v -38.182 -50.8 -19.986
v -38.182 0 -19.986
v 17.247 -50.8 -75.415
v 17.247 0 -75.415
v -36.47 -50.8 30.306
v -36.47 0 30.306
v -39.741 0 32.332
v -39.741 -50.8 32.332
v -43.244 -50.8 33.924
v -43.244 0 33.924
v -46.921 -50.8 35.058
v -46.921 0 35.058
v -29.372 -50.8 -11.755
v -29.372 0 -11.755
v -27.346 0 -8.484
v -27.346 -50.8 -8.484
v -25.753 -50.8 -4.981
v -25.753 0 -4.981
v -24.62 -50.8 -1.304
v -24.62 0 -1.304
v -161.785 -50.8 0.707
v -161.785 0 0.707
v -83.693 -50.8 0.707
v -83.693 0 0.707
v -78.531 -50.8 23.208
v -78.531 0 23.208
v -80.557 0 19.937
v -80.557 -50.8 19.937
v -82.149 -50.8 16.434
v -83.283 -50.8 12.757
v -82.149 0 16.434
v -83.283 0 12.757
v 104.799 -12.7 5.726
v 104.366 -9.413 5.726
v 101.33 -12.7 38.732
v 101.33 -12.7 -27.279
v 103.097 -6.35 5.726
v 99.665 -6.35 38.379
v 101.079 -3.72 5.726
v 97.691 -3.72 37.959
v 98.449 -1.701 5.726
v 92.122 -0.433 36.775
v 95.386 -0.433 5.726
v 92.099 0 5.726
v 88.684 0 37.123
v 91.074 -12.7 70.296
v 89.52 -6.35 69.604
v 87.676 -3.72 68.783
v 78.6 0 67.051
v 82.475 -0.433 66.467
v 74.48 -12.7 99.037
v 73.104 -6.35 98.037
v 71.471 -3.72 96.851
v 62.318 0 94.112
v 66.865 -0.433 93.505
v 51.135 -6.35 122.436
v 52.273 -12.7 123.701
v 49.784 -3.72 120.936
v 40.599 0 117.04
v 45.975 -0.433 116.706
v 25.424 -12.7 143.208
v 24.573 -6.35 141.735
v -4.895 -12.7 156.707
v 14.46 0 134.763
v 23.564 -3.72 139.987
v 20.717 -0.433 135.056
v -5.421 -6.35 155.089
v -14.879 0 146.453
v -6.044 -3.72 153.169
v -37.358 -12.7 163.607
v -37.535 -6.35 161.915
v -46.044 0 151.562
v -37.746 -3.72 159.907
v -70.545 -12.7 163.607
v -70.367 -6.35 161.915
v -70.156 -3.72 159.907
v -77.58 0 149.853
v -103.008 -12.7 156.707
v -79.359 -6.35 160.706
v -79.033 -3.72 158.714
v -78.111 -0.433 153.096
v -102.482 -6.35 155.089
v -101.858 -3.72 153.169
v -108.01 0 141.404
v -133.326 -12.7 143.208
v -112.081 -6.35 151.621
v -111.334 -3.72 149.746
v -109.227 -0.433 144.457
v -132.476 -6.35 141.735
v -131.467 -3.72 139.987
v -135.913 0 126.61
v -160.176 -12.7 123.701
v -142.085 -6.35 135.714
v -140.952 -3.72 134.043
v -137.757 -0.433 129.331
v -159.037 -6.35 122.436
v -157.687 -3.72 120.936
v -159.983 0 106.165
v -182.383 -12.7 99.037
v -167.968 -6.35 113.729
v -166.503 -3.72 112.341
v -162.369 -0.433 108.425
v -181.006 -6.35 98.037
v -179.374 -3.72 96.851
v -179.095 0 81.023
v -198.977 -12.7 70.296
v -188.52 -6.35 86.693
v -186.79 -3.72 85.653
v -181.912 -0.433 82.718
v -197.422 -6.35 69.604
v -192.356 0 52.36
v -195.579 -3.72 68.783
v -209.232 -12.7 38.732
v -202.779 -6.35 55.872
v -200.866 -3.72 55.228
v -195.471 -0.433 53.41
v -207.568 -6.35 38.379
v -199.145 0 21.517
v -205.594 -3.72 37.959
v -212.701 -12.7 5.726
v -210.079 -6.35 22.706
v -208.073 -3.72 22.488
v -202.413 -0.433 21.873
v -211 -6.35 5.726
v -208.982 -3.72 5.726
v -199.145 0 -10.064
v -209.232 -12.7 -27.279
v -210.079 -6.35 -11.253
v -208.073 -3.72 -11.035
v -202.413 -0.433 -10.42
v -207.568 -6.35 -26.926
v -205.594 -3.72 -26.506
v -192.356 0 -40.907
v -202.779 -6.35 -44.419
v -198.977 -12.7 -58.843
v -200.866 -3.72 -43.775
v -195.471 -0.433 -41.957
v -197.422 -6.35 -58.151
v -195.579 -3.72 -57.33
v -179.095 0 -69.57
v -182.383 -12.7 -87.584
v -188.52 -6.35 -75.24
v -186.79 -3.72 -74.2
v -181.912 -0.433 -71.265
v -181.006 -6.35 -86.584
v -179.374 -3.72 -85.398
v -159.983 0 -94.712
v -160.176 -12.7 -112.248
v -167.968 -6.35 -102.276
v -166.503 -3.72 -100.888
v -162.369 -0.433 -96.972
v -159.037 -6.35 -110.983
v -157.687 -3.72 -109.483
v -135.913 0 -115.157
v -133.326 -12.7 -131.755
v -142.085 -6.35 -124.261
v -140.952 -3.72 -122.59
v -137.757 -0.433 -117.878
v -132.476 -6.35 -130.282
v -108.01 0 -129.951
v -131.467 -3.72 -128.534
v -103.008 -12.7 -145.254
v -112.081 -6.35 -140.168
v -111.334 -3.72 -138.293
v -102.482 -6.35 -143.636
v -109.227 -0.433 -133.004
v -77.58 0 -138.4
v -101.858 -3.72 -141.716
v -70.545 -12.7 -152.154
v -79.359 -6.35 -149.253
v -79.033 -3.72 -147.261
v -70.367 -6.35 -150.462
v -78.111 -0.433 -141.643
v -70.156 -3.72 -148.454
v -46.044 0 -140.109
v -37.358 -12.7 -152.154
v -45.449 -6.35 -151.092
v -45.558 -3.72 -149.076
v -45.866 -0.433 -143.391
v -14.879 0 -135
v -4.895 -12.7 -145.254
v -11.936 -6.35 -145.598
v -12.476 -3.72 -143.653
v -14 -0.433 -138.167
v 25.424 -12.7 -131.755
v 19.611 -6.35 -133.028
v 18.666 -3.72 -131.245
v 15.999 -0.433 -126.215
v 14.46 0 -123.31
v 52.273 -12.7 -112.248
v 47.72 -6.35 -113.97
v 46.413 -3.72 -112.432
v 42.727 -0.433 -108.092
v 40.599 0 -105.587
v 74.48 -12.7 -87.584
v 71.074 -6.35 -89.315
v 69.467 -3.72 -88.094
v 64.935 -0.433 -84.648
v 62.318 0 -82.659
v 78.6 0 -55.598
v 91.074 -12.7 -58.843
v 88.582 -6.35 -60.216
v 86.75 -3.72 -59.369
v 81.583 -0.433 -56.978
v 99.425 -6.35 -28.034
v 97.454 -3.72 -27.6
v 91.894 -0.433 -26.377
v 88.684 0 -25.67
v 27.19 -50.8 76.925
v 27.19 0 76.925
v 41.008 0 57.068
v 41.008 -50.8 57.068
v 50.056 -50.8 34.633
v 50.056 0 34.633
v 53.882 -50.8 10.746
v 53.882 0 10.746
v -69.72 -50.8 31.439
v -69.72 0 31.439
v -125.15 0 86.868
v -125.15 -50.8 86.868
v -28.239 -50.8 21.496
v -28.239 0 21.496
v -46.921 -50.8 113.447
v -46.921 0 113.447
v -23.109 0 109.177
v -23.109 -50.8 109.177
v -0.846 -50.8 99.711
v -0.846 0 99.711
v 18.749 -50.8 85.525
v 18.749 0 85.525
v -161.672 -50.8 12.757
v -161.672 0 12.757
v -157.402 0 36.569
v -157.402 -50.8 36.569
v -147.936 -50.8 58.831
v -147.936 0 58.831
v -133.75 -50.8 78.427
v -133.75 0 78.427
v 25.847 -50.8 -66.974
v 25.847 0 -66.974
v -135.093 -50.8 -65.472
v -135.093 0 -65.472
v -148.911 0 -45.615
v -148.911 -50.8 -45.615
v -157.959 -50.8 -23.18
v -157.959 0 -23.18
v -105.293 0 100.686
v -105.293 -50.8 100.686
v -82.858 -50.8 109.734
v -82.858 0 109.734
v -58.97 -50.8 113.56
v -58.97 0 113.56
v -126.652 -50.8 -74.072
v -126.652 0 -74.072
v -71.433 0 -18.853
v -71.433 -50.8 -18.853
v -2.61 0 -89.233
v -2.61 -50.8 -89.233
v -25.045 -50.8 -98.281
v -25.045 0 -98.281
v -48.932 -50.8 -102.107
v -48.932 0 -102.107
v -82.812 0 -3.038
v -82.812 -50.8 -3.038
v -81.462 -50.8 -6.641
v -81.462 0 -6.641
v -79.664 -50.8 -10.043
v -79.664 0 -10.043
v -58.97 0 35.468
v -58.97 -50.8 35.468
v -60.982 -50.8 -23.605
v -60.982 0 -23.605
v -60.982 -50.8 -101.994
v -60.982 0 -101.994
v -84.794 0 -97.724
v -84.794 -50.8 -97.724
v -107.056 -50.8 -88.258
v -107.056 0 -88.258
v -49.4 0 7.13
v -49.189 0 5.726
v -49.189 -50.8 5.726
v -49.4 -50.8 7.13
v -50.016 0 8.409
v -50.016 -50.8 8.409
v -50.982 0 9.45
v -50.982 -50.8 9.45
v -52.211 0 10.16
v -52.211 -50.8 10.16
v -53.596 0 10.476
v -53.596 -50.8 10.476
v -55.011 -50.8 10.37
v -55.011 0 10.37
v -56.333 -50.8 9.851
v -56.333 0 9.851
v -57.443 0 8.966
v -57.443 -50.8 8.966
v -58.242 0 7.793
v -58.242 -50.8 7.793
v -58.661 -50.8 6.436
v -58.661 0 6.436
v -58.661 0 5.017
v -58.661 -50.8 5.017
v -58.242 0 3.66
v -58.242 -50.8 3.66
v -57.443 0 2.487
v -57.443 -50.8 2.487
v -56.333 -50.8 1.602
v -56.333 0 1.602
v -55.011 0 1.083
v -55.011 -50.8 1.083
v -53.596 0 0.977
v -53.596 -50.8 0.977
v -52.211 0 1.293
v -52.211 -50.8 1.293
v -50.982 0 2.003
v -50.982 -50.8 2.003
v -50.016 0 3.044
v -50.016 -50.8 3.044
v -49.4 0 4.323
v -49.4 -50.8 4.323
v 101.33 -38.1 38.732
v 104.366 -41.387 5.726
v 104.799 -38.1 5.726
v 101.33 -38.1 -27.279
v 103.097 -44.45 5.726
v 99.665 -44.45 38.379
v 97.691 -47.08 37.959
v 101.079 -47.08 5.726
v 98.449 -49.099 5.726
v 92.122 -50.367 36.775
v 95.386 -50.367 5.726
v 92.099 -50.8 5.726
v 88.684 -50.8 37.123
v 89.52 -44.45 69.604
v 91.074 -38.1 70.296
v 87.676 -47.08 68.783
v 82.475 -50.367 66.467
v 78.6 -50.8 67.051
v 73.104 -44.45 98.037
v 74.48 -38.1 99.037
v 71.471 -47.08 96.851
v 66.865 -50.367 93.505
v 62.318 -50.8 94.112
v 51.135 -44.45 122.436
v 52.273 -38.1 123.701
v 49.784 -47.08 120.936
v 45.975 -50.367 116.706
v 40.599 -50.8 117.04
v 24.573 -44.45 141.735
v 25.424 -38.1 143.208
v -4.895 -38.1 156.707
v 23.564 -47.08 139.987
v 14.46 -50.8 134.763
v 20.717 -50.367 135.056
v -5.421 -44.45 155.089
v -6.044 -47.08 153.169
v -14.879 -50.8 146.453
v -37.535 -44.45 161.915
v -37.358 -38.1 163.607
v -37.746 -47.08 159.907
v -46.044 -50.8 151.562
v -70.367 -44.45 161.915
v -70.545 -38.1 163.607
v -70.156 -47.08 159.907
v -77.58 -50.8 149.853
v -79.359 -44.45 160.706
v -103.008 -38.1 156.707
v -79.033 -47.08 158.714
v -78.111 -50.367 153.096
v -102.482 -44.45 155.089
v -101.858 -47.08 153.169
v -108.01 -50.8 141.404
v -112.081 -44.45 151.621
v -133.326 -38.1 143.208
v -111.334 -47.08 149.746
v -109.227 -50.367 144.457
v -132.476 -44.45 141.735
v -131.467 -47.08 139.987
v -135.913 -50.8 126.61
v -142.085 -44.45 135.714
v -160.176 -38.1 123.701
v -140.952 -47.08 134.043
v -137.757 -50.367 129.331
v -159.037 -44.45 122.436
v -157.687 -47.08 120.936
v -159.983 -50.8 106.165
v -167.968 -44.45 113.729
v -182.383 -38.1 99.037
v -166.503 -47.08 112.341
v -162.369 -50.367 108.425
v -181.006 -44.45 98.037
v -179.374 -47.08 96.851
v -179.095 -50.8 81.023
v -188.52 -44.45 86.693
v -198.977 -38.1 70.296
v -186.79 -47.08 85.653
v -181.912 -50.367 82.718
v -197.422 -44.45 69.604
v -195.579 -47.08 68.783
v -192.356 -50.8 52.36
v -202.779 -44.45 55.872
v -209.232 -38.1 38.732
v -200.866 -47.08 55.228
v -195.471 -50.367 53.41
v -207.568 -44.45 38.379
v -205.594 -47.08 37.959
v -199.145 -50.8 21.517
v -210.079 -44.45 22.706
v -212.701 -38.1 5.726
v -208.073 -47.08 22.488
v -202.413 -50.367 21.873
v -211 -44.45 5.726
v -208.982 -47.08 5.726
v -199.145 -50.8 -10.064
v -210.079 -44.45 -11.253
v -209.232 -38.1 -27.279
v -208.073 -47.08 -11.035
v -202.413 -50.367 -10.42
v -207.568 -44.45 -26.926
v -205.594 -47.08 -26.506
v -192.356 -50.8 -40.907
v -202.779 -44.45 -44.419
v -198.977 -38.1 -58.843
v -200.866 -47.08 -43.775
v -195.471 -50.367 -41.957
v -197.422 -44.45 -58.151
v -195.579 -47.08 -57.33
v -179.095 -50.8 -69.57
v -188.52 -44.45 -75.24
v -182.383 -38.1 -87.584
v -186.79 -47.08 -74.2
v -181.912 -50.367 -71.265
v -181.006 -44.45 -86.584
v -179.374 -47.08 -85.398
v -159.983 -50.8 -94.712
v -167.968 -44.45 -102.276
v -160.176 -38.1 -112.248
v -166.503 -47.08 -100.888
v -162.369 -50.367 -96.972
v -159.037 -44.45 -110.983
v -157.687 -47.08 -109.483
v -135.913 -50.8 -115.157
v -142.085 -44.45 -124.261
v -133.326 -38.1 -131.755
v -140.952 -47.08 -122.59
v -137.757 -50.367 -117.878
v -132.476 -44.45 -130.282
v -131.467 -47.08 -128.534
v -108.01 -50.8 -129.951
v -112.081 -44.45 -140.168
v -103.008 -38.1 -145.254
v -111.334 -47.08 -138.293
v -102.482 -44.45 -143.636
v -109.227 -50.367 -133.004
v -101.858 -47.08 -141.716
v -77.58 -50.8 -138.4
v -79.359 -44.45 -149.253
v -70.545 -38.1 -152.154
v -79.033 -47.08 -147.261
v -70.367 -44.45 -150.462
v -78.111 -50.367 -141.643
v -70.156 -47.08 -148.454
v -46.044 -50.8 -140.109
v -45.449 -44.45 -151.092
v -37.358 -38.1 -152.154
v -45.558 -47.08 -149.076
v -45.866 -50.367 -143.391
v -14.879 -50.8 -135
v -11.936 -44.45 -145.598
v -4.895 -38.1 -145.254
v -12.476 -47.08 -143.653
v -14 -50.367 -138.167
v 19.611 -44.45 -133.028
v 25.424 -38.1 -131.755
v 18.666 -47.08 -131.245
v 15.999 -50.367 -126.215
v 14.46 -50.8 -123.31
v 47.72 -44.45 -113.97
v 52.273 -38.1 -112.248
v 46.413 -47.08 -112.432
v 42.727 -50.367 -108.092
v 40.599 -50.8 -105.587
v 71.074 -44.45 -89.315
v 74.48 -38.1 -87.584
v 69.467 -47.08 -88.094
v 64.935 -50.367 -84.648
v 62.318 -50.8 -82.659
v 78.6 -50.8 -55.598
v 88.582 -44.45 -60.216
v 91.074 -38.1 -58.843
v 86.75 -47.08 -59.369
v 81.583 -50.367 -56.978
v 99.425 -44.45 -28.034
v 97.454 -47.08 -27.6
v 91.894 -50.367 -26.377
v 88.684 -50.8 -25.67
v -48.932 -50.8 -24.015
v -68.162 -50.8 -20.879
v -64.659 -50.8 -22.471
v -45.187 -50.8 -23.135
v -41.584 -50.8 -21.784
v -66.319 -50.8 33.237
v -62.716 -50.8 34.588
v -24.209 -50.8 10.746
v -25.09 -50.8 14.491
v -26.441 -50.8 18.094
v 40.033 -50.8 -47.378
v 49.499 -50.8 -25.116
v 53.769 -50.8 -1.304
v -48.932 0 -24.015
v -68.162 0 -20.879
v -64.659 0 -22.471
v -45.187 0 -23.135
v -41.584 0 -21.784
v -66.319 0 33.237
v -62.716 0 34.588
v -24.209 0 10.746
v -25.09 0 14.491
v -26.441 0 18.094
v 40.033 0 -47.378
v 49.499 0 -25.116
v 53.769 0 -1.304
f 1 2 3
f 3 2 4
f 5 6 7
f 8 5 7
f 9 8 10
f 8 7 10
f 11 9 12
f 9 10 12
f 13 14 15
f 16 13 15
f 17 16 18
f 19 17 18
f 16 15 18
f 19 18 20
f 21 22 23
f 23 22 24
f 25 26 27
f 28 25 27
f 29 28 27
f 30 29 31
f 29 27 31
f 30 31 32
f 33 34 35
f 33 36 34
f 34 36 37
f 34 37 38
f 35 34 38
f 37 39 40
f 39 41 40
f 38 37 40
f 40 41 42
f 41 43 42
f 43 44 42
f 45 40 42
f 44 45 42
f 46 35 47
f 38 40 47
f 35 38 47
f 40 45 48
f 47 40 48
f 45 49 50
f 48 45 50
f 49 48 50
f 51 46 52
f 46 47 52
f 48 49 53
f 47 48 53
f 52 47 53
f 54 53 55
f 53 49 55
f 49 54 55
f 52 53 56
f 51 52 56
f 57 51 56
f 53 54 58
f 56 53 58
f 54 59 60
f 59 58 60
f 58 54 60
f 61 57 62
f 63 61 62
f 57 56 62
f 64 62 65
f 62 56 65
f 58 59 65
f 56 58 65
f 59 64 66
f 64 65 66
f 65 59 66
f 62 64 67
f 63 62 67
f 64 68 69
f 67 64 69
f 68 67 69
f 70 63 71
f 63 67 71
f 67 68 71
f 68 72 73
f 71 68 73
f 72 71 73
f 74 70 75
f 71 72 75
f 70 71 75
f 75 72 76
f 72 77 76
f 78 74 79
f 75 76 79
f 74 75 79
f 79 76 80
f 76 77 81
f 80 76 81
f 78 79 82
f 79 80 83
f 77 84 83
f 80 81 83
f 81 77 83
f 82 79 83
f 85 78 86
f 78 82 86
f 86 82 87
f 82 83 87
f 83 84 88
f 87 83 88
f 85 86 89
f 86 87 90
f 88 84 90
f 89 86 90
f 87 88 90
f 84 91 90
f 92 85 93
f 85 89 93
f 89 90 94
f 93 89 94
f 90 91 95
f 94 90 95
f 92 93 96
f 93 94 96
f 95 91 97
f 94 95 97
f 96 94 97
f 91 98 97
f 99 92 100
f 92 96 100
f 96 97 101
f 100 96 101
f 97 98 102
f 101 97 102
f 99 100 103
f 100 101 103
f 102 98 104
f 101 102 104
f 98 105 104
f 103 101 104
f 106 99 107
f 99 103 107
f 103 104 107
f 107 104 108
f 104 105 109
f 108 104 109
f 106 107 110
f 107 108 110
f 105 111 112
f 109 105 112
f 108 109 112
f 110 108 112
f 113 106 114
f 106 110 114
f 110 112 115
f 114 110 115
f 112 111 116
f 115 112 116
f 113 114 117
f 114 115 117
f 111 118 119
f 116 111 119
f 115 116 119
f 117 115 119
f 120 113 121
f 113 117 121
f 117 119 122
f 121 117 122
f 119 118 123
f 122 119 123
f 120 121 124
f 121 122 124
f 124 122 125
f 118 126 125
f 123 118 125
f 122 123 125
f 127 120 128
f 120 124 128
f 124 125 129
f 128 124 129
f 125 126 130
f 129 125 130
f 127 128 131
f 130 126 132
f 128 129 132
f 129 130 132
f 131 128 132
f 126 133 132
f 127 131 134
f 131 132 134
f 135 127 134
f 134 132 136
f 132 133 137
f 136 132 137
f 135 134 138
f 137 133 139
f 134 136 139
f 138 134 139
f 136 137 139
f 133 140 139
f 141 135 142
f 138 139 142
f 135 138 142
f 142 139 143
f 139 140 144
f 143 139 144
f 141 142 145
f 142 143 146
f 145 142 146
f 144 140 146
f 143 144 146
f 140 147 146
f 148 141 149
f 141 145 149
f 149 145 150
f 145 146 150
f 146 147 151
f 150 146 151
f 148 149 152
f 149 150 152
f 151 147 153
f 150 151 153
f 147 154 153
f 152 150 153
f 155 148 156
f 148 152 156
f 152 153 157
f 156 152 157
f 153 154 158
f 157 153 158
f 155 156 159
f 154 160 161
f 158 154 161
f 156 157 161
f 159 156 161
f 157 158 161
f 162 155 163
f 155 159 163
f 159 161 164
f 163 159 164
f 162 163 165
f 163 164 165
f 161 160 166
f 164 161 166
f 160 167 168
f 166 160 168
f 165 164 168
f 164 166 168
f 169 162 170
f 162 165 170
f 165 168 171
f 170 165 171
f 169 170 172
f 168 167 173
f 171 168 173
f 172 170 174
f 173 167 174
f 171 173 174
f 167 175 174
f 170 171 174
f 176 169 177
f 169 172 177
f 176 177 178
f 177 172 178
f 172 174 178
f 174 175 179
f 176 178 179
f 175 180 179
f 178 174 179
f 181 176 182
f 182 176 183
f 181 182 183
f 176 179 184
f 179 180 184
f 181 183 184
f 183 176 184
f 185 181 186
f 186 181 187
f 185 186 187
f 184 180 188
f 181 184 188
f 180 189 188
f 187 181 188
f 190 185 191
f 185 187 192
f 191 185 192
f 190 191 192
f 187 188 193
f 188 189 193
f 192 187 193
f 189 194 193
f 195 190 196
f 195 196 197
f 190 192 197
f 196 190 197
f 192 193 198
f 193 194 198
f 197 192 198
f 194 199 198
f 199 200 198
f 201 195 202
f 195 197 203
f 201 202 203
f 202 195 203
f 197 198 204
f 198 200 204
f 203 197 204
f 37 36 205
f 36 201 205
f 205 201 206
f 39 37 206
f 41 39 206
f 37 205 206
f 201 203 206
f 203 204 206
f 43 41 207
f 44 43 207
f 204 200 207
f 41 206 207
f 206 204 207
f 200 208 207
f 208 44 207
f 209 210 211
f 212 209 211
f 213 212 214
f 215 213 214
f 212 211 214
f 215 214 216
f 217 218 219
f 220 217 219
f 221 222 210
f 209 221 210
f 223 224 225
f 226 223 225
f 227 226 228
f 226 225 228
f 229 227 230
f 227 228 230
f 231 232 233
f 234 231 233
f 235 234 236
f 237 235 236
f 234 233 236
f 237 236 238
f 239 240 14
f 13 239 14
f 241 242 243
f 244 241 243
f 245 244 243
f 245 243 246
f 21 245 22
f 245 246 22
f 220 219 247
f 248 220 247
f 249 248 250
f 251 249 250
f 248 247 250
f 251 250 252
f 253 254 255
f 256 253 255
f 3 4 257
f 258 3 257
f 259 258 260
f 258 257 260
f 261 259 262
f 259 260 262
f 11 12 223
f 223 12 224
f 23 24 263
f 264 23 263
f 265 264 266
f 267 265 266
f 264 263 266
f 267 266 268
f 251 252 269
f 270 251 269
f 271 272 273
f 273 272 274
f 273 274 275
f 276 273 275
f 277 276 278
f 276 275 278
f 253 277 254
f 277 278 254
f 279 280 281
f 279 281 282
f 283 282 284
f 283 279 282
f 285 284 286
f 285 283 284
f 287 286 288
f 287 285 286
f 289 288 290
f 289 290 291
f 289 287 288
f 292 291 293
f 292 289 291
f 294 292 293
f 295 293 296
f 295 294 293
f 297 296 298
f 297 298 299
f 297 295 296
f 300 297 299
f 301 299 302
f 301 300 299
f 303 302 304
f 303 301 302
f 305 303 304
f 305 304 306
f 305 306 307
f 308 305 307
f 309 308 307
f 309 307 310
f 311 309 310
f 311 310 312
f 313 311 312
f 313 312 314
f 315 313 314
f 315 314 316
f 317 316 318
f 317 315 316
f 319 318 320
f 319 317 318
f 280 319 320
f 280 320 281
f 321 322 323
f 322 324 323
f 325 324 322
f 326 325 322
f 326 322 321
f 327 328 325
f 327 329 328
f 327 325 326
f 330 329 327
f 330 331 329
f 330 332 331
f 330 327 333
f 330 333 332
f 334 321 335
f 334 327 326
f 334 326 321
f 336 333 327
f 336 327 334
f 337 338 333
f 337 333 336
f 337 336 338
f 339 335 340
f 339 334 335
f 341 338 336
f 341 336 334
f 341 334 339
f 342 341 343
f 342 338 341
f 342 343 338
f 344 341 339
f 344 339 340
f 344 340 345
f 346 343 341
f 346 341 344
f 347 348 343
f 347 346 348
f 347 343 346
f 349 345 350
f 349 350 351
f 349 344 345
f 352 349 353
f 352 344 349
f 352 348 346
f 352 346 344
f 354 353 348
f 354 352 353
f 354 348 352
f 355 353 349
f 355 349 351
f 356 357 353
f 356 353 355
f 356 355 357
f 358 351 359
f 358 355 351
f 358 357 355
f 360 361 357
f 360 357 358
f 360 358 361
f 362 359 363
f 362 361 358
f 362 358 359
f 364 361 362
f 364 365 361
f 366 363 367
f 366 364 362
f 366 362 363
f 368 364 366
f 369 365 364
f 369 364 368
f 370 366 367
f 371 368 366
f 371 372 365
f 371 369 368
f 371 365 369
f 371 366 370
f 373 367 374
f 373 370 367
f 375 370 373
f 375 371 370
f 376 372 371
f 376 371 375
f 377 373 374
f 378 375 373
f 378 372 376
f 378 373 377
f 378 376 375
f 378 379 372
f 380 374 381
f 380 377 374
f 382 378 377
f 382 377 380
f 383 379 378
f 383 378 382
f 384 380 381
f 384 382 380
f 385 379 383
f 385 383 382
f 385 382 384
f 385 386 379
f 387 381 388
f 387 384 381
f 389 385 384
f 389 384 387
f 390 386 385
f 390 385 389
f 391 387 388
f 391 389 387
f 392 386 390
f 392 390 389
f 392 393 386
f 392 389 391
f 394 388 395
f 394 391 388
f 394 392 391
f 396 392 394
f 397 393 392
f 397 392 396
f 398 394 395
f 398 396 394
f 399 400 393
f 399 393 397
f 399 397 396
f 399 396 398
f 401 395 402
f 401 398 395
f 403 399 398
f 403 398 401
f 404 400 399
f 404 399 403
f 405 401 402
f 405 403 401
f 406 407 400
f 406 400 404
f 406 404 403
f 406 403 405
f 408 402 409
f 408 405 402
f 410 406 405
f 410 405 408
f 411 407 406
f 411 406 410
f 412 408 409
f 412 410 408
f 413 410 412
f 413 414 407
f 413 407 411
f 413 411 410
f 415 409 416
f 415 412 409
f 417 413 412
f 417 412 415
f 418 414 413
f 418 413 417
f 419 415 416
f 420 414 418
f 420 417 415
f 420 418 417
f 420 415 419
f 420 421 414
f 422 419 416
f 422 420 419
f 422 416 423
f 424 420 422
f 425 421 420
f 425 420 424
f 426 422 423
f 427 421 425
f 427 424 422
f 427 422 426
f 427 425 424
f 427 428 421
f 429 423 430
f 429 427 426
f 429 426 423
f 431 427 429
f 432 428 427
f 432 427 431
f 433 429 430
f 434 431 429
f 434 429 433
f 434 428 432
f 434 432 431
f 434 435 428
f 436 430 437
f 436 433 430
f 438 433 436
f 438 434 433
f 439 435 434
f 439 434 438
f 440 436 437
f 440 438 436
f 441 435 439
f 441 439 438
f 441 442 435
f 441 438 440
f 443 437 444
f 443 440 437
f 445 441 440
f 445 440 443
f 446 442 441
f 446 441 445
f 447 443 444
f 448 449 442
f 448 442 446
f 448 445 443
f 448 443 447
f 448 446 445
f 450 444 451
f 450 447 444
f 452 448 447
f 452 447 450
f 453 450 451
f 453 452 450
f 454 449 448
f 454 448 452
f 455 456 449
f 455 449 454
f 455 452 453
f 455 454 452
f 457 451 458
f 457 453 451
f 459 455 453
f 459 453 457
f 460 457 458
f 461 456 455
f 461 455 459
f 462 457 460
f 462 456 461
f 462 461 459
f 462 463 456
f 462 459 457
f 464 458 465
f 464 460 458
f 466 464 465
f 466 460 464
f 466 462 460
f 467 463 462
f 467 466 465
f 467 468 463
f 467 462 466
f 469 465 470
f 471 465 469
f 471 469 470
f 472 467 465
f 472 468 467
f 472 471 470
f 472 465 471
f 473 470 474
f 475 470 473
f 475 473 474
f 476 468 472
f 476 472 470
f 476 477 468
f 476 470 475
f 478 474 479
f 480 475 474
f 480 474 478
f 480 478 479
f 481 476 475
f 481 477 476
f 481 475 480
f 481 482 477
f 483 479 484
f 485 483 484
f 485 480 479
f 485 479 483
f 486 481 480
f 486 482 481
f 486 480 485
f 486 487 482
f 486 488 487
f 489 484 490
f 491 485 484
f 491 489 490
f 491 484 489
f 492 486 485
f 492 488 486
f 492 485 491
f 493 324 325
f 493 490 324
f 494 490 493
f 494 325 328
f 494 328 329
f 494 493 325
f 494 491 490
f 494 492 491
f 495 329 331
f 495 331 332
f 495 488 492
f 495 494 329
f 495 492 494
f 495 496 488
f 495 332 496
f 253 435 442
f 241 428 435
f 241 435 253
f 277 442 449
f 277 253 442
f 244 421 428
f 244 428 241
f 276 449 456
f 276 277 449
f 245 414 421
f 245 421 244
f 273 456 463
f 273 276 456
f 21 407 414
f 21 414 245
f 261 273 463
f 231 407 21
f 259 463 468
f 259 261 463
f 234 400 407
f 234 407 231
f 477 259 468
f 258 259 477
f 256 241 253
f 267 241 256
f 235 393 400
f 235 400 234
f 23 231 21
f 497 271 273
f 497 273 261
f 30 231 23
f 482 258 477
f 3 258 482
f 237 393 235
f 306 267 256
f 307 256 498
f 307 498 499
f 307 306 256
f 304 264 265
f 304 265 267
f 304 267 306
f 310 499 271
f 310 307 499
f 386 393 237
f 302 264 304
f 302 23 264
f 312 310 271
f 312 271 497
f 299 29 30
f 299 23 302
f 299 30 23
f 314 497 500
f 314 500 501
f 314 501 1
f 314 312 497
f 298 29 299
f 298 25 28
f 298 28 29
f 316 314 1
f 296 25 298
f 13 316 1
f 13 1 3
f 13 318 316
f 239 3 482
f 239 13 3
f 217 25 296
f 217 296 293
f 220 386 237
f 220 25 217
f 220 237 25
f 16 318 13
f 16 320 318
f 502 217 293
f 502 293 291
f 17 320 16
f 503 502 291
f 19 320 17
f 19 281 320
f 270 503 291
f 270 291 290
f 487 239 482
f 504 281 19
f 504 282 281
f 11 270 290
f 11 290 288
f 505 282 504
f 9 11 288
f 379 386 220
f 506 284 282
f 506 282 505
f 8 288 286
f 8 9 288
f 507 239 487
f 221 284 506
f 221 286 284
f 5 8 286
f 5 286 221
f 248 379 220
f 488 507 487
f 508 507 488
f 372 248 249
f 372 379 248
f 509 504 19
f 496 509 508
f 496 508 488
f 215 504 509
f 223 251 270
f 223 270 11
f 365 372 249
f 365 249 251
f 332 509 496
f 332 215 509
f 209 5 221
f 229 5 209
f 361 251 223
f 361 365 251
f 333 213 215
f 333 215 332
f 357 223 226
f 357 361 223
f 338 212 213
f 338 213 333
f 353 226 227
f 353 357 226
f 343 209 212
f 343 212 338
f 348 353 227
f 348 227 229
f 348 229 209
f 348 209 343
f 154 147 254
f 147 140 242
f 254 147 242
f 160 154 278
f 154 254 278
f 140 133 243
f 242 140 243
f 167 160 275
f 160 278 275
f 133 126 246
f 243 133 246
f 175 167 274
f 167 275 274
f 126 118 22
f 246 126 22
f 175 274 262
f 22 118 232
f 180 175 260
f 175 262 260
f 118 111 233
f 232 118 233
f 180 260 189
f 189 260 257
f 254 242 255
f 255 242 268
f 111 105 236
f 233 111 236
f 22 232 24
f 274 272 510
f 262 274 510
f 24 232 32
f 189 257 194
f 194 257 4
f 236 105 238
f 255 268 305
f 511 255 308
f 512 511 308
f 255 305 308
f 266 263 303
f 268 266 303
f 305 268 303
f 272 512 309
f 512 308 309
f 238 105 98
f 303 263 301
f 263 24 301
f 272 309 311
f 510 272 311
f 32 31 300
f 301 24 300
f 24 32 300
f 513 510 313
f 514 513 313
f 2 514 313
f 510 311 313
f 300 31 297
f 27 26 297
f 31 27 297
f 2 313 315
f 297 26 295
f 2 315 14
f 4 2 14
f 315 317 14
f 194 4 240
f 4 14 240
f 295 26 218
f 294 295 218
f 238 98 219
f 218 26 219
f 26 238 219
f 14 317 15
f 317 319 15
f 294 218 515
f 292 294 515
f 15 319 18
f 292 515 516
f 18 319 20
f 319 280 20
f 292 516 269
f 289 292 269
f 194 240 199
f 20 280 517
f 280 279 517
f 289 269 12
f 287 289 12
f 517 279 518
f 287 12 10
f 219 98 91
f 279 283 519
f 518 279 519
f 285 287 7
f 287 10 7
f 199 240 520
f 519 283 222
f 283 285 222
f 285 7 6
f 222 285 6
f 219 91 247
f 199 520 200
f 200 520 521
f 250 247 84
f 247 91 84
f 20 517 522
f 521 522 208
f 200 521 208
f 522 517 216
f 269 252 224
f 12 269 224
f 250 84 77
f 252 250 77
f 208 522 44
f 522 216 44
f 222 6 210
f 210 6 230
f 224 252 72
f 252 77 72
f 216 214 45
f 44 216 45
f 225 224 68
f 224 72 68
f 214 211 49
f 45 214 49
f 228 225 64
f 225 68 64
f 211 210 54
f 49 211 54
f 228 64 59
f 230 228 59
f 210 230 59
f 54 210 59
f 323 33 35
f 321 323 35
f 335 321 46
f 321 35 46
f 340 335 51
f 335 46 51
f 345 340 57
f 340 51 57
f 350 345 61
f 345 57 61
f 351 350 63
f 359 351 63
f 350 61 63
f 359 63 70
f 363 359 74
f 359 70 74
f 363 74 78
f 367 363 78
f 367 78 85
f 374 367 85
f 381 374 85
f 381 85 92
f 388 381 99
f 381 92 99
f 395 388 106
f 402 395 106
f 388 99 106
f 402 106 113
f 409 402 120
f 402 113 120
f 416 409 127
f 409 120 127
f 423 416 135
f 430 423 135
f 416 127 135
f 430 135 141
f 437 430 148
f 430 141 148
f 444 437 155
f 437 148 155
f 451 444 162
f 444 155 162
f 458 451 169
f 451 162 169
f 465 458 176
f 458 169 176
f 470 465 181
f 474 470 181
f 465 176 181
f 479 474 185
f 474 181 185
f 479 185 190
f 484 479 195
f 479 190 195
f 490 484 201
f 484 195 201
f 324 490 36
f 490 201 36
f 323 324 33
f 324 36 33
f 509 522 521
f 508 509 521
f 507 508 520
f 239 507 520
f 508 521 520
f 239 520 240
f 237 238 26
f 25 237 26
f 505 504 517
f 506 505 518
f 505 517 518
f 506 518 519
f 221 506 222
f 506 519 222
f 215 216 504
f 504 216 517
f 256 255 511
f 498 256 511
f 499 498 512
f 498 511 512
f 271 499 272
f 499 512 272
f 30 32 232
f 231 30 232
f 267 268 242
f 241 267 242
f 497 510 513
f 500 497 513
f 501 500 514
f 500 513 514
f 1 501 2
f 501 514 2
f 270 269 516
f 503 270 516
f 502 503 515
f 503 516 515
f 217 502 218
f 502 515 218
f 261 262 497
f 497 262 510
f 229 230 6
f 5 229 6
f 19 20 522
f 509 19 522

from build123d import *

# Parameters (mm, degrees)
F0_R     = 158.75
F0_R_2   = 4.7625
F1_DEPTH = 50.8
F2_R     = 12.7


with BuildPart() as f1:
    # F0 (on Front) → F1 (new body)
    with BuildSketch(Plane.XZ):
        with Locations((-53.951404, 5.726499)):
            Circle(F0_R)
        with BuildLine():
            Line((-122.349605, -69.769714), (-71.433156, -18.853265))
            ThreePointArc((-71.433156, -18.853265), (-66.435836, -21.731021), (-60.982177, -23.605133))
            Line((-60.982177, -23.605133), (-60.982177, -95.783764))
            Line((-60.982177, -95.783764), (-60.982177, -101.994301))
            ThreePointArc((-60.982177, -101.994301), (-96.191027, -93.616427), (-126.652027, -74.072136))
            Line((-126.652027, -74.072136), (-122.349605, -69.769714))
        make_face(mode=Mode.SUBTRACT)
        with BuildLine():
            Line((-155.70012, 0.707446), (-83.693387, 0.707446))
            ThreePointArc((-83.693387, 0.707446), (-82.194629, -4.861074), (-79.663508, -10.04259))
            Line((-79.663508, -10.04259), (-130.701507, -61.080589))
            Line((-130.701507, -61.080589), (-135.09302, -65.472102))
            ThreePointArc((-135.09302, -65.472102), (-154.065384, -34.651634), (-161.784663, 0.707446))
            Line((-161.784663, 0.707446), (-155.70012, 0.707446))
        make_face(mode=Mode.SUBTRACT)
        with BuildLine():
            Line((-48.932352, -96.022217), (-48.932352, -24.015484))
            ThreePointArc((-48.932352, -24.015484), (-43.363832, -22.516726), (-38.182316, -19.985605))
            Line((-38.182316, -19.985605), (12.855683, -71.023604))
            Line((12.855683, -71.023604), (17.247196, -75.415117))
            ThreePointArc((17.247196, -75.415117), (-13.573272, -94.387481), (-48.932352, -102.10676))
            Line((-48.932352, -102.10676), (-48.932352, -96.022217))
        make_face(mode=Mode.SUBTRACT)
        with BuildLine():
            Line((21.544808, -62.671702), (-29.371641, -11.755253))
            ThreePointArc((-29.371641, -11.755253), (-26.493885, -6.757933), (-24.619772, -1.304274))
            Line((-24.619772, -1.304274), (47.558858, -1.304274))
            Line((47.558858, -1.304274), (53.769395, -1.304274))
            ThreePointArc((53.769395, -1.304274), (45.391521, -36.513124), (25.84723, -66.974124))
            Line((25.84723, -66.974124), (21.544808, -62.671702))
        make_face(mode=Mode.SUBTRACT)
        with BuildLine():
            ThreePointArc((-78.531168, 23.20825), (-81.408924, 18.21093), (-83.283036, 12.757272))
            Line((-83.283036, 12.757272), (-155.461667, 12.757272))
            Line((-155.461667, 12.757272), (-161.672204, 12.757272))
            ThreePointArc((-161.672204, 12.757272), (-153.29433, 47.966121), (-133.750039, 78.427121))
            Line((-133.750039, 78.427121), (-129.447617, 74.124699))
            Line((-129.447617, 74.124699), (-78.531168, 23.20825))
        make_face(mode=Mode.SUBTRACT)
        with BuildLine():
            ThreePointArc((-125.150005, 86.868114), (-94.329537, 105.840478), (-58.970457, 113.559757))
            Line((-58.970457, 113.559757), (-58.970457, 107.475214))
            Line((-58.970457, 107.475214), (-58.970457, 35.468481))
            ThreePointArc((-58.970457, 35.468481), (-64.538977, 33.969723), (-69.720493, 31.438602))
            Line((-69.720493, 31.438602), (-120.758492, 82.476601))
            Line((-120.758492, 82.476601), (-125.150005, 86.868114))
        make_face(mode=Mode.SUBTRACT)
        with Locations((-53.951404, 5.726499)):
            Circle(F0_R_2, mode=Mode.SUBTRACT)
        with BuildLine():
            ThreePointArc((-24.209422, 10.745551), (-25.70818, 16.314071), (-28.239301, 21.495587))
            Line((-28.239301, 21.495587), (22.798698, 72.533586))
            Line((22.798698, 72.533586), (27.190211, 76.925099))
            ThreePointArc((27.190211, 76.925099), (46.162575, 46.104631), (53.881854, 10.745551))
            Line((53.881854, 10.745551), (47.797311, 10.745551))
            Line((47.797311, 10.745551), (-24.209422, 10.745551))
        make_face(mode=Mode.SUBTRACT)
        with BuildLine():
            Line((14.446796, 81.222711), (-36.469653, 30.306262))
            ThreePointArc((-36.469653, 30.306262), (-41.466973, 33.184018), (-46.920631, 35.058131))
            Line((-46.920631, 35.058131), (-46.920631, 107.236761))
            Line((-46.920631, 107.236761), (-46.920631, 113.447298))
            ThreePointArc((-46.920631, 113.447298), (-11.711782, 105.069424), (18.749218, 85.525133))
            Line((18.749218, 85.525133), (14.446796, 81.222711))
        make_face(mode=Mode.SUBTRACT)
    extrude(amount=F1_DEPTH)

    # F2
    f2_edges = [f1.edges().sort_by_distance(p)[0] for p in [
        (-212.701404, -50.8, 5.726499),
        (-212.701404, 0, 5.726499),
    ]]
    fillet(f2_edges, radius=F2_R)


solid = f1.part
